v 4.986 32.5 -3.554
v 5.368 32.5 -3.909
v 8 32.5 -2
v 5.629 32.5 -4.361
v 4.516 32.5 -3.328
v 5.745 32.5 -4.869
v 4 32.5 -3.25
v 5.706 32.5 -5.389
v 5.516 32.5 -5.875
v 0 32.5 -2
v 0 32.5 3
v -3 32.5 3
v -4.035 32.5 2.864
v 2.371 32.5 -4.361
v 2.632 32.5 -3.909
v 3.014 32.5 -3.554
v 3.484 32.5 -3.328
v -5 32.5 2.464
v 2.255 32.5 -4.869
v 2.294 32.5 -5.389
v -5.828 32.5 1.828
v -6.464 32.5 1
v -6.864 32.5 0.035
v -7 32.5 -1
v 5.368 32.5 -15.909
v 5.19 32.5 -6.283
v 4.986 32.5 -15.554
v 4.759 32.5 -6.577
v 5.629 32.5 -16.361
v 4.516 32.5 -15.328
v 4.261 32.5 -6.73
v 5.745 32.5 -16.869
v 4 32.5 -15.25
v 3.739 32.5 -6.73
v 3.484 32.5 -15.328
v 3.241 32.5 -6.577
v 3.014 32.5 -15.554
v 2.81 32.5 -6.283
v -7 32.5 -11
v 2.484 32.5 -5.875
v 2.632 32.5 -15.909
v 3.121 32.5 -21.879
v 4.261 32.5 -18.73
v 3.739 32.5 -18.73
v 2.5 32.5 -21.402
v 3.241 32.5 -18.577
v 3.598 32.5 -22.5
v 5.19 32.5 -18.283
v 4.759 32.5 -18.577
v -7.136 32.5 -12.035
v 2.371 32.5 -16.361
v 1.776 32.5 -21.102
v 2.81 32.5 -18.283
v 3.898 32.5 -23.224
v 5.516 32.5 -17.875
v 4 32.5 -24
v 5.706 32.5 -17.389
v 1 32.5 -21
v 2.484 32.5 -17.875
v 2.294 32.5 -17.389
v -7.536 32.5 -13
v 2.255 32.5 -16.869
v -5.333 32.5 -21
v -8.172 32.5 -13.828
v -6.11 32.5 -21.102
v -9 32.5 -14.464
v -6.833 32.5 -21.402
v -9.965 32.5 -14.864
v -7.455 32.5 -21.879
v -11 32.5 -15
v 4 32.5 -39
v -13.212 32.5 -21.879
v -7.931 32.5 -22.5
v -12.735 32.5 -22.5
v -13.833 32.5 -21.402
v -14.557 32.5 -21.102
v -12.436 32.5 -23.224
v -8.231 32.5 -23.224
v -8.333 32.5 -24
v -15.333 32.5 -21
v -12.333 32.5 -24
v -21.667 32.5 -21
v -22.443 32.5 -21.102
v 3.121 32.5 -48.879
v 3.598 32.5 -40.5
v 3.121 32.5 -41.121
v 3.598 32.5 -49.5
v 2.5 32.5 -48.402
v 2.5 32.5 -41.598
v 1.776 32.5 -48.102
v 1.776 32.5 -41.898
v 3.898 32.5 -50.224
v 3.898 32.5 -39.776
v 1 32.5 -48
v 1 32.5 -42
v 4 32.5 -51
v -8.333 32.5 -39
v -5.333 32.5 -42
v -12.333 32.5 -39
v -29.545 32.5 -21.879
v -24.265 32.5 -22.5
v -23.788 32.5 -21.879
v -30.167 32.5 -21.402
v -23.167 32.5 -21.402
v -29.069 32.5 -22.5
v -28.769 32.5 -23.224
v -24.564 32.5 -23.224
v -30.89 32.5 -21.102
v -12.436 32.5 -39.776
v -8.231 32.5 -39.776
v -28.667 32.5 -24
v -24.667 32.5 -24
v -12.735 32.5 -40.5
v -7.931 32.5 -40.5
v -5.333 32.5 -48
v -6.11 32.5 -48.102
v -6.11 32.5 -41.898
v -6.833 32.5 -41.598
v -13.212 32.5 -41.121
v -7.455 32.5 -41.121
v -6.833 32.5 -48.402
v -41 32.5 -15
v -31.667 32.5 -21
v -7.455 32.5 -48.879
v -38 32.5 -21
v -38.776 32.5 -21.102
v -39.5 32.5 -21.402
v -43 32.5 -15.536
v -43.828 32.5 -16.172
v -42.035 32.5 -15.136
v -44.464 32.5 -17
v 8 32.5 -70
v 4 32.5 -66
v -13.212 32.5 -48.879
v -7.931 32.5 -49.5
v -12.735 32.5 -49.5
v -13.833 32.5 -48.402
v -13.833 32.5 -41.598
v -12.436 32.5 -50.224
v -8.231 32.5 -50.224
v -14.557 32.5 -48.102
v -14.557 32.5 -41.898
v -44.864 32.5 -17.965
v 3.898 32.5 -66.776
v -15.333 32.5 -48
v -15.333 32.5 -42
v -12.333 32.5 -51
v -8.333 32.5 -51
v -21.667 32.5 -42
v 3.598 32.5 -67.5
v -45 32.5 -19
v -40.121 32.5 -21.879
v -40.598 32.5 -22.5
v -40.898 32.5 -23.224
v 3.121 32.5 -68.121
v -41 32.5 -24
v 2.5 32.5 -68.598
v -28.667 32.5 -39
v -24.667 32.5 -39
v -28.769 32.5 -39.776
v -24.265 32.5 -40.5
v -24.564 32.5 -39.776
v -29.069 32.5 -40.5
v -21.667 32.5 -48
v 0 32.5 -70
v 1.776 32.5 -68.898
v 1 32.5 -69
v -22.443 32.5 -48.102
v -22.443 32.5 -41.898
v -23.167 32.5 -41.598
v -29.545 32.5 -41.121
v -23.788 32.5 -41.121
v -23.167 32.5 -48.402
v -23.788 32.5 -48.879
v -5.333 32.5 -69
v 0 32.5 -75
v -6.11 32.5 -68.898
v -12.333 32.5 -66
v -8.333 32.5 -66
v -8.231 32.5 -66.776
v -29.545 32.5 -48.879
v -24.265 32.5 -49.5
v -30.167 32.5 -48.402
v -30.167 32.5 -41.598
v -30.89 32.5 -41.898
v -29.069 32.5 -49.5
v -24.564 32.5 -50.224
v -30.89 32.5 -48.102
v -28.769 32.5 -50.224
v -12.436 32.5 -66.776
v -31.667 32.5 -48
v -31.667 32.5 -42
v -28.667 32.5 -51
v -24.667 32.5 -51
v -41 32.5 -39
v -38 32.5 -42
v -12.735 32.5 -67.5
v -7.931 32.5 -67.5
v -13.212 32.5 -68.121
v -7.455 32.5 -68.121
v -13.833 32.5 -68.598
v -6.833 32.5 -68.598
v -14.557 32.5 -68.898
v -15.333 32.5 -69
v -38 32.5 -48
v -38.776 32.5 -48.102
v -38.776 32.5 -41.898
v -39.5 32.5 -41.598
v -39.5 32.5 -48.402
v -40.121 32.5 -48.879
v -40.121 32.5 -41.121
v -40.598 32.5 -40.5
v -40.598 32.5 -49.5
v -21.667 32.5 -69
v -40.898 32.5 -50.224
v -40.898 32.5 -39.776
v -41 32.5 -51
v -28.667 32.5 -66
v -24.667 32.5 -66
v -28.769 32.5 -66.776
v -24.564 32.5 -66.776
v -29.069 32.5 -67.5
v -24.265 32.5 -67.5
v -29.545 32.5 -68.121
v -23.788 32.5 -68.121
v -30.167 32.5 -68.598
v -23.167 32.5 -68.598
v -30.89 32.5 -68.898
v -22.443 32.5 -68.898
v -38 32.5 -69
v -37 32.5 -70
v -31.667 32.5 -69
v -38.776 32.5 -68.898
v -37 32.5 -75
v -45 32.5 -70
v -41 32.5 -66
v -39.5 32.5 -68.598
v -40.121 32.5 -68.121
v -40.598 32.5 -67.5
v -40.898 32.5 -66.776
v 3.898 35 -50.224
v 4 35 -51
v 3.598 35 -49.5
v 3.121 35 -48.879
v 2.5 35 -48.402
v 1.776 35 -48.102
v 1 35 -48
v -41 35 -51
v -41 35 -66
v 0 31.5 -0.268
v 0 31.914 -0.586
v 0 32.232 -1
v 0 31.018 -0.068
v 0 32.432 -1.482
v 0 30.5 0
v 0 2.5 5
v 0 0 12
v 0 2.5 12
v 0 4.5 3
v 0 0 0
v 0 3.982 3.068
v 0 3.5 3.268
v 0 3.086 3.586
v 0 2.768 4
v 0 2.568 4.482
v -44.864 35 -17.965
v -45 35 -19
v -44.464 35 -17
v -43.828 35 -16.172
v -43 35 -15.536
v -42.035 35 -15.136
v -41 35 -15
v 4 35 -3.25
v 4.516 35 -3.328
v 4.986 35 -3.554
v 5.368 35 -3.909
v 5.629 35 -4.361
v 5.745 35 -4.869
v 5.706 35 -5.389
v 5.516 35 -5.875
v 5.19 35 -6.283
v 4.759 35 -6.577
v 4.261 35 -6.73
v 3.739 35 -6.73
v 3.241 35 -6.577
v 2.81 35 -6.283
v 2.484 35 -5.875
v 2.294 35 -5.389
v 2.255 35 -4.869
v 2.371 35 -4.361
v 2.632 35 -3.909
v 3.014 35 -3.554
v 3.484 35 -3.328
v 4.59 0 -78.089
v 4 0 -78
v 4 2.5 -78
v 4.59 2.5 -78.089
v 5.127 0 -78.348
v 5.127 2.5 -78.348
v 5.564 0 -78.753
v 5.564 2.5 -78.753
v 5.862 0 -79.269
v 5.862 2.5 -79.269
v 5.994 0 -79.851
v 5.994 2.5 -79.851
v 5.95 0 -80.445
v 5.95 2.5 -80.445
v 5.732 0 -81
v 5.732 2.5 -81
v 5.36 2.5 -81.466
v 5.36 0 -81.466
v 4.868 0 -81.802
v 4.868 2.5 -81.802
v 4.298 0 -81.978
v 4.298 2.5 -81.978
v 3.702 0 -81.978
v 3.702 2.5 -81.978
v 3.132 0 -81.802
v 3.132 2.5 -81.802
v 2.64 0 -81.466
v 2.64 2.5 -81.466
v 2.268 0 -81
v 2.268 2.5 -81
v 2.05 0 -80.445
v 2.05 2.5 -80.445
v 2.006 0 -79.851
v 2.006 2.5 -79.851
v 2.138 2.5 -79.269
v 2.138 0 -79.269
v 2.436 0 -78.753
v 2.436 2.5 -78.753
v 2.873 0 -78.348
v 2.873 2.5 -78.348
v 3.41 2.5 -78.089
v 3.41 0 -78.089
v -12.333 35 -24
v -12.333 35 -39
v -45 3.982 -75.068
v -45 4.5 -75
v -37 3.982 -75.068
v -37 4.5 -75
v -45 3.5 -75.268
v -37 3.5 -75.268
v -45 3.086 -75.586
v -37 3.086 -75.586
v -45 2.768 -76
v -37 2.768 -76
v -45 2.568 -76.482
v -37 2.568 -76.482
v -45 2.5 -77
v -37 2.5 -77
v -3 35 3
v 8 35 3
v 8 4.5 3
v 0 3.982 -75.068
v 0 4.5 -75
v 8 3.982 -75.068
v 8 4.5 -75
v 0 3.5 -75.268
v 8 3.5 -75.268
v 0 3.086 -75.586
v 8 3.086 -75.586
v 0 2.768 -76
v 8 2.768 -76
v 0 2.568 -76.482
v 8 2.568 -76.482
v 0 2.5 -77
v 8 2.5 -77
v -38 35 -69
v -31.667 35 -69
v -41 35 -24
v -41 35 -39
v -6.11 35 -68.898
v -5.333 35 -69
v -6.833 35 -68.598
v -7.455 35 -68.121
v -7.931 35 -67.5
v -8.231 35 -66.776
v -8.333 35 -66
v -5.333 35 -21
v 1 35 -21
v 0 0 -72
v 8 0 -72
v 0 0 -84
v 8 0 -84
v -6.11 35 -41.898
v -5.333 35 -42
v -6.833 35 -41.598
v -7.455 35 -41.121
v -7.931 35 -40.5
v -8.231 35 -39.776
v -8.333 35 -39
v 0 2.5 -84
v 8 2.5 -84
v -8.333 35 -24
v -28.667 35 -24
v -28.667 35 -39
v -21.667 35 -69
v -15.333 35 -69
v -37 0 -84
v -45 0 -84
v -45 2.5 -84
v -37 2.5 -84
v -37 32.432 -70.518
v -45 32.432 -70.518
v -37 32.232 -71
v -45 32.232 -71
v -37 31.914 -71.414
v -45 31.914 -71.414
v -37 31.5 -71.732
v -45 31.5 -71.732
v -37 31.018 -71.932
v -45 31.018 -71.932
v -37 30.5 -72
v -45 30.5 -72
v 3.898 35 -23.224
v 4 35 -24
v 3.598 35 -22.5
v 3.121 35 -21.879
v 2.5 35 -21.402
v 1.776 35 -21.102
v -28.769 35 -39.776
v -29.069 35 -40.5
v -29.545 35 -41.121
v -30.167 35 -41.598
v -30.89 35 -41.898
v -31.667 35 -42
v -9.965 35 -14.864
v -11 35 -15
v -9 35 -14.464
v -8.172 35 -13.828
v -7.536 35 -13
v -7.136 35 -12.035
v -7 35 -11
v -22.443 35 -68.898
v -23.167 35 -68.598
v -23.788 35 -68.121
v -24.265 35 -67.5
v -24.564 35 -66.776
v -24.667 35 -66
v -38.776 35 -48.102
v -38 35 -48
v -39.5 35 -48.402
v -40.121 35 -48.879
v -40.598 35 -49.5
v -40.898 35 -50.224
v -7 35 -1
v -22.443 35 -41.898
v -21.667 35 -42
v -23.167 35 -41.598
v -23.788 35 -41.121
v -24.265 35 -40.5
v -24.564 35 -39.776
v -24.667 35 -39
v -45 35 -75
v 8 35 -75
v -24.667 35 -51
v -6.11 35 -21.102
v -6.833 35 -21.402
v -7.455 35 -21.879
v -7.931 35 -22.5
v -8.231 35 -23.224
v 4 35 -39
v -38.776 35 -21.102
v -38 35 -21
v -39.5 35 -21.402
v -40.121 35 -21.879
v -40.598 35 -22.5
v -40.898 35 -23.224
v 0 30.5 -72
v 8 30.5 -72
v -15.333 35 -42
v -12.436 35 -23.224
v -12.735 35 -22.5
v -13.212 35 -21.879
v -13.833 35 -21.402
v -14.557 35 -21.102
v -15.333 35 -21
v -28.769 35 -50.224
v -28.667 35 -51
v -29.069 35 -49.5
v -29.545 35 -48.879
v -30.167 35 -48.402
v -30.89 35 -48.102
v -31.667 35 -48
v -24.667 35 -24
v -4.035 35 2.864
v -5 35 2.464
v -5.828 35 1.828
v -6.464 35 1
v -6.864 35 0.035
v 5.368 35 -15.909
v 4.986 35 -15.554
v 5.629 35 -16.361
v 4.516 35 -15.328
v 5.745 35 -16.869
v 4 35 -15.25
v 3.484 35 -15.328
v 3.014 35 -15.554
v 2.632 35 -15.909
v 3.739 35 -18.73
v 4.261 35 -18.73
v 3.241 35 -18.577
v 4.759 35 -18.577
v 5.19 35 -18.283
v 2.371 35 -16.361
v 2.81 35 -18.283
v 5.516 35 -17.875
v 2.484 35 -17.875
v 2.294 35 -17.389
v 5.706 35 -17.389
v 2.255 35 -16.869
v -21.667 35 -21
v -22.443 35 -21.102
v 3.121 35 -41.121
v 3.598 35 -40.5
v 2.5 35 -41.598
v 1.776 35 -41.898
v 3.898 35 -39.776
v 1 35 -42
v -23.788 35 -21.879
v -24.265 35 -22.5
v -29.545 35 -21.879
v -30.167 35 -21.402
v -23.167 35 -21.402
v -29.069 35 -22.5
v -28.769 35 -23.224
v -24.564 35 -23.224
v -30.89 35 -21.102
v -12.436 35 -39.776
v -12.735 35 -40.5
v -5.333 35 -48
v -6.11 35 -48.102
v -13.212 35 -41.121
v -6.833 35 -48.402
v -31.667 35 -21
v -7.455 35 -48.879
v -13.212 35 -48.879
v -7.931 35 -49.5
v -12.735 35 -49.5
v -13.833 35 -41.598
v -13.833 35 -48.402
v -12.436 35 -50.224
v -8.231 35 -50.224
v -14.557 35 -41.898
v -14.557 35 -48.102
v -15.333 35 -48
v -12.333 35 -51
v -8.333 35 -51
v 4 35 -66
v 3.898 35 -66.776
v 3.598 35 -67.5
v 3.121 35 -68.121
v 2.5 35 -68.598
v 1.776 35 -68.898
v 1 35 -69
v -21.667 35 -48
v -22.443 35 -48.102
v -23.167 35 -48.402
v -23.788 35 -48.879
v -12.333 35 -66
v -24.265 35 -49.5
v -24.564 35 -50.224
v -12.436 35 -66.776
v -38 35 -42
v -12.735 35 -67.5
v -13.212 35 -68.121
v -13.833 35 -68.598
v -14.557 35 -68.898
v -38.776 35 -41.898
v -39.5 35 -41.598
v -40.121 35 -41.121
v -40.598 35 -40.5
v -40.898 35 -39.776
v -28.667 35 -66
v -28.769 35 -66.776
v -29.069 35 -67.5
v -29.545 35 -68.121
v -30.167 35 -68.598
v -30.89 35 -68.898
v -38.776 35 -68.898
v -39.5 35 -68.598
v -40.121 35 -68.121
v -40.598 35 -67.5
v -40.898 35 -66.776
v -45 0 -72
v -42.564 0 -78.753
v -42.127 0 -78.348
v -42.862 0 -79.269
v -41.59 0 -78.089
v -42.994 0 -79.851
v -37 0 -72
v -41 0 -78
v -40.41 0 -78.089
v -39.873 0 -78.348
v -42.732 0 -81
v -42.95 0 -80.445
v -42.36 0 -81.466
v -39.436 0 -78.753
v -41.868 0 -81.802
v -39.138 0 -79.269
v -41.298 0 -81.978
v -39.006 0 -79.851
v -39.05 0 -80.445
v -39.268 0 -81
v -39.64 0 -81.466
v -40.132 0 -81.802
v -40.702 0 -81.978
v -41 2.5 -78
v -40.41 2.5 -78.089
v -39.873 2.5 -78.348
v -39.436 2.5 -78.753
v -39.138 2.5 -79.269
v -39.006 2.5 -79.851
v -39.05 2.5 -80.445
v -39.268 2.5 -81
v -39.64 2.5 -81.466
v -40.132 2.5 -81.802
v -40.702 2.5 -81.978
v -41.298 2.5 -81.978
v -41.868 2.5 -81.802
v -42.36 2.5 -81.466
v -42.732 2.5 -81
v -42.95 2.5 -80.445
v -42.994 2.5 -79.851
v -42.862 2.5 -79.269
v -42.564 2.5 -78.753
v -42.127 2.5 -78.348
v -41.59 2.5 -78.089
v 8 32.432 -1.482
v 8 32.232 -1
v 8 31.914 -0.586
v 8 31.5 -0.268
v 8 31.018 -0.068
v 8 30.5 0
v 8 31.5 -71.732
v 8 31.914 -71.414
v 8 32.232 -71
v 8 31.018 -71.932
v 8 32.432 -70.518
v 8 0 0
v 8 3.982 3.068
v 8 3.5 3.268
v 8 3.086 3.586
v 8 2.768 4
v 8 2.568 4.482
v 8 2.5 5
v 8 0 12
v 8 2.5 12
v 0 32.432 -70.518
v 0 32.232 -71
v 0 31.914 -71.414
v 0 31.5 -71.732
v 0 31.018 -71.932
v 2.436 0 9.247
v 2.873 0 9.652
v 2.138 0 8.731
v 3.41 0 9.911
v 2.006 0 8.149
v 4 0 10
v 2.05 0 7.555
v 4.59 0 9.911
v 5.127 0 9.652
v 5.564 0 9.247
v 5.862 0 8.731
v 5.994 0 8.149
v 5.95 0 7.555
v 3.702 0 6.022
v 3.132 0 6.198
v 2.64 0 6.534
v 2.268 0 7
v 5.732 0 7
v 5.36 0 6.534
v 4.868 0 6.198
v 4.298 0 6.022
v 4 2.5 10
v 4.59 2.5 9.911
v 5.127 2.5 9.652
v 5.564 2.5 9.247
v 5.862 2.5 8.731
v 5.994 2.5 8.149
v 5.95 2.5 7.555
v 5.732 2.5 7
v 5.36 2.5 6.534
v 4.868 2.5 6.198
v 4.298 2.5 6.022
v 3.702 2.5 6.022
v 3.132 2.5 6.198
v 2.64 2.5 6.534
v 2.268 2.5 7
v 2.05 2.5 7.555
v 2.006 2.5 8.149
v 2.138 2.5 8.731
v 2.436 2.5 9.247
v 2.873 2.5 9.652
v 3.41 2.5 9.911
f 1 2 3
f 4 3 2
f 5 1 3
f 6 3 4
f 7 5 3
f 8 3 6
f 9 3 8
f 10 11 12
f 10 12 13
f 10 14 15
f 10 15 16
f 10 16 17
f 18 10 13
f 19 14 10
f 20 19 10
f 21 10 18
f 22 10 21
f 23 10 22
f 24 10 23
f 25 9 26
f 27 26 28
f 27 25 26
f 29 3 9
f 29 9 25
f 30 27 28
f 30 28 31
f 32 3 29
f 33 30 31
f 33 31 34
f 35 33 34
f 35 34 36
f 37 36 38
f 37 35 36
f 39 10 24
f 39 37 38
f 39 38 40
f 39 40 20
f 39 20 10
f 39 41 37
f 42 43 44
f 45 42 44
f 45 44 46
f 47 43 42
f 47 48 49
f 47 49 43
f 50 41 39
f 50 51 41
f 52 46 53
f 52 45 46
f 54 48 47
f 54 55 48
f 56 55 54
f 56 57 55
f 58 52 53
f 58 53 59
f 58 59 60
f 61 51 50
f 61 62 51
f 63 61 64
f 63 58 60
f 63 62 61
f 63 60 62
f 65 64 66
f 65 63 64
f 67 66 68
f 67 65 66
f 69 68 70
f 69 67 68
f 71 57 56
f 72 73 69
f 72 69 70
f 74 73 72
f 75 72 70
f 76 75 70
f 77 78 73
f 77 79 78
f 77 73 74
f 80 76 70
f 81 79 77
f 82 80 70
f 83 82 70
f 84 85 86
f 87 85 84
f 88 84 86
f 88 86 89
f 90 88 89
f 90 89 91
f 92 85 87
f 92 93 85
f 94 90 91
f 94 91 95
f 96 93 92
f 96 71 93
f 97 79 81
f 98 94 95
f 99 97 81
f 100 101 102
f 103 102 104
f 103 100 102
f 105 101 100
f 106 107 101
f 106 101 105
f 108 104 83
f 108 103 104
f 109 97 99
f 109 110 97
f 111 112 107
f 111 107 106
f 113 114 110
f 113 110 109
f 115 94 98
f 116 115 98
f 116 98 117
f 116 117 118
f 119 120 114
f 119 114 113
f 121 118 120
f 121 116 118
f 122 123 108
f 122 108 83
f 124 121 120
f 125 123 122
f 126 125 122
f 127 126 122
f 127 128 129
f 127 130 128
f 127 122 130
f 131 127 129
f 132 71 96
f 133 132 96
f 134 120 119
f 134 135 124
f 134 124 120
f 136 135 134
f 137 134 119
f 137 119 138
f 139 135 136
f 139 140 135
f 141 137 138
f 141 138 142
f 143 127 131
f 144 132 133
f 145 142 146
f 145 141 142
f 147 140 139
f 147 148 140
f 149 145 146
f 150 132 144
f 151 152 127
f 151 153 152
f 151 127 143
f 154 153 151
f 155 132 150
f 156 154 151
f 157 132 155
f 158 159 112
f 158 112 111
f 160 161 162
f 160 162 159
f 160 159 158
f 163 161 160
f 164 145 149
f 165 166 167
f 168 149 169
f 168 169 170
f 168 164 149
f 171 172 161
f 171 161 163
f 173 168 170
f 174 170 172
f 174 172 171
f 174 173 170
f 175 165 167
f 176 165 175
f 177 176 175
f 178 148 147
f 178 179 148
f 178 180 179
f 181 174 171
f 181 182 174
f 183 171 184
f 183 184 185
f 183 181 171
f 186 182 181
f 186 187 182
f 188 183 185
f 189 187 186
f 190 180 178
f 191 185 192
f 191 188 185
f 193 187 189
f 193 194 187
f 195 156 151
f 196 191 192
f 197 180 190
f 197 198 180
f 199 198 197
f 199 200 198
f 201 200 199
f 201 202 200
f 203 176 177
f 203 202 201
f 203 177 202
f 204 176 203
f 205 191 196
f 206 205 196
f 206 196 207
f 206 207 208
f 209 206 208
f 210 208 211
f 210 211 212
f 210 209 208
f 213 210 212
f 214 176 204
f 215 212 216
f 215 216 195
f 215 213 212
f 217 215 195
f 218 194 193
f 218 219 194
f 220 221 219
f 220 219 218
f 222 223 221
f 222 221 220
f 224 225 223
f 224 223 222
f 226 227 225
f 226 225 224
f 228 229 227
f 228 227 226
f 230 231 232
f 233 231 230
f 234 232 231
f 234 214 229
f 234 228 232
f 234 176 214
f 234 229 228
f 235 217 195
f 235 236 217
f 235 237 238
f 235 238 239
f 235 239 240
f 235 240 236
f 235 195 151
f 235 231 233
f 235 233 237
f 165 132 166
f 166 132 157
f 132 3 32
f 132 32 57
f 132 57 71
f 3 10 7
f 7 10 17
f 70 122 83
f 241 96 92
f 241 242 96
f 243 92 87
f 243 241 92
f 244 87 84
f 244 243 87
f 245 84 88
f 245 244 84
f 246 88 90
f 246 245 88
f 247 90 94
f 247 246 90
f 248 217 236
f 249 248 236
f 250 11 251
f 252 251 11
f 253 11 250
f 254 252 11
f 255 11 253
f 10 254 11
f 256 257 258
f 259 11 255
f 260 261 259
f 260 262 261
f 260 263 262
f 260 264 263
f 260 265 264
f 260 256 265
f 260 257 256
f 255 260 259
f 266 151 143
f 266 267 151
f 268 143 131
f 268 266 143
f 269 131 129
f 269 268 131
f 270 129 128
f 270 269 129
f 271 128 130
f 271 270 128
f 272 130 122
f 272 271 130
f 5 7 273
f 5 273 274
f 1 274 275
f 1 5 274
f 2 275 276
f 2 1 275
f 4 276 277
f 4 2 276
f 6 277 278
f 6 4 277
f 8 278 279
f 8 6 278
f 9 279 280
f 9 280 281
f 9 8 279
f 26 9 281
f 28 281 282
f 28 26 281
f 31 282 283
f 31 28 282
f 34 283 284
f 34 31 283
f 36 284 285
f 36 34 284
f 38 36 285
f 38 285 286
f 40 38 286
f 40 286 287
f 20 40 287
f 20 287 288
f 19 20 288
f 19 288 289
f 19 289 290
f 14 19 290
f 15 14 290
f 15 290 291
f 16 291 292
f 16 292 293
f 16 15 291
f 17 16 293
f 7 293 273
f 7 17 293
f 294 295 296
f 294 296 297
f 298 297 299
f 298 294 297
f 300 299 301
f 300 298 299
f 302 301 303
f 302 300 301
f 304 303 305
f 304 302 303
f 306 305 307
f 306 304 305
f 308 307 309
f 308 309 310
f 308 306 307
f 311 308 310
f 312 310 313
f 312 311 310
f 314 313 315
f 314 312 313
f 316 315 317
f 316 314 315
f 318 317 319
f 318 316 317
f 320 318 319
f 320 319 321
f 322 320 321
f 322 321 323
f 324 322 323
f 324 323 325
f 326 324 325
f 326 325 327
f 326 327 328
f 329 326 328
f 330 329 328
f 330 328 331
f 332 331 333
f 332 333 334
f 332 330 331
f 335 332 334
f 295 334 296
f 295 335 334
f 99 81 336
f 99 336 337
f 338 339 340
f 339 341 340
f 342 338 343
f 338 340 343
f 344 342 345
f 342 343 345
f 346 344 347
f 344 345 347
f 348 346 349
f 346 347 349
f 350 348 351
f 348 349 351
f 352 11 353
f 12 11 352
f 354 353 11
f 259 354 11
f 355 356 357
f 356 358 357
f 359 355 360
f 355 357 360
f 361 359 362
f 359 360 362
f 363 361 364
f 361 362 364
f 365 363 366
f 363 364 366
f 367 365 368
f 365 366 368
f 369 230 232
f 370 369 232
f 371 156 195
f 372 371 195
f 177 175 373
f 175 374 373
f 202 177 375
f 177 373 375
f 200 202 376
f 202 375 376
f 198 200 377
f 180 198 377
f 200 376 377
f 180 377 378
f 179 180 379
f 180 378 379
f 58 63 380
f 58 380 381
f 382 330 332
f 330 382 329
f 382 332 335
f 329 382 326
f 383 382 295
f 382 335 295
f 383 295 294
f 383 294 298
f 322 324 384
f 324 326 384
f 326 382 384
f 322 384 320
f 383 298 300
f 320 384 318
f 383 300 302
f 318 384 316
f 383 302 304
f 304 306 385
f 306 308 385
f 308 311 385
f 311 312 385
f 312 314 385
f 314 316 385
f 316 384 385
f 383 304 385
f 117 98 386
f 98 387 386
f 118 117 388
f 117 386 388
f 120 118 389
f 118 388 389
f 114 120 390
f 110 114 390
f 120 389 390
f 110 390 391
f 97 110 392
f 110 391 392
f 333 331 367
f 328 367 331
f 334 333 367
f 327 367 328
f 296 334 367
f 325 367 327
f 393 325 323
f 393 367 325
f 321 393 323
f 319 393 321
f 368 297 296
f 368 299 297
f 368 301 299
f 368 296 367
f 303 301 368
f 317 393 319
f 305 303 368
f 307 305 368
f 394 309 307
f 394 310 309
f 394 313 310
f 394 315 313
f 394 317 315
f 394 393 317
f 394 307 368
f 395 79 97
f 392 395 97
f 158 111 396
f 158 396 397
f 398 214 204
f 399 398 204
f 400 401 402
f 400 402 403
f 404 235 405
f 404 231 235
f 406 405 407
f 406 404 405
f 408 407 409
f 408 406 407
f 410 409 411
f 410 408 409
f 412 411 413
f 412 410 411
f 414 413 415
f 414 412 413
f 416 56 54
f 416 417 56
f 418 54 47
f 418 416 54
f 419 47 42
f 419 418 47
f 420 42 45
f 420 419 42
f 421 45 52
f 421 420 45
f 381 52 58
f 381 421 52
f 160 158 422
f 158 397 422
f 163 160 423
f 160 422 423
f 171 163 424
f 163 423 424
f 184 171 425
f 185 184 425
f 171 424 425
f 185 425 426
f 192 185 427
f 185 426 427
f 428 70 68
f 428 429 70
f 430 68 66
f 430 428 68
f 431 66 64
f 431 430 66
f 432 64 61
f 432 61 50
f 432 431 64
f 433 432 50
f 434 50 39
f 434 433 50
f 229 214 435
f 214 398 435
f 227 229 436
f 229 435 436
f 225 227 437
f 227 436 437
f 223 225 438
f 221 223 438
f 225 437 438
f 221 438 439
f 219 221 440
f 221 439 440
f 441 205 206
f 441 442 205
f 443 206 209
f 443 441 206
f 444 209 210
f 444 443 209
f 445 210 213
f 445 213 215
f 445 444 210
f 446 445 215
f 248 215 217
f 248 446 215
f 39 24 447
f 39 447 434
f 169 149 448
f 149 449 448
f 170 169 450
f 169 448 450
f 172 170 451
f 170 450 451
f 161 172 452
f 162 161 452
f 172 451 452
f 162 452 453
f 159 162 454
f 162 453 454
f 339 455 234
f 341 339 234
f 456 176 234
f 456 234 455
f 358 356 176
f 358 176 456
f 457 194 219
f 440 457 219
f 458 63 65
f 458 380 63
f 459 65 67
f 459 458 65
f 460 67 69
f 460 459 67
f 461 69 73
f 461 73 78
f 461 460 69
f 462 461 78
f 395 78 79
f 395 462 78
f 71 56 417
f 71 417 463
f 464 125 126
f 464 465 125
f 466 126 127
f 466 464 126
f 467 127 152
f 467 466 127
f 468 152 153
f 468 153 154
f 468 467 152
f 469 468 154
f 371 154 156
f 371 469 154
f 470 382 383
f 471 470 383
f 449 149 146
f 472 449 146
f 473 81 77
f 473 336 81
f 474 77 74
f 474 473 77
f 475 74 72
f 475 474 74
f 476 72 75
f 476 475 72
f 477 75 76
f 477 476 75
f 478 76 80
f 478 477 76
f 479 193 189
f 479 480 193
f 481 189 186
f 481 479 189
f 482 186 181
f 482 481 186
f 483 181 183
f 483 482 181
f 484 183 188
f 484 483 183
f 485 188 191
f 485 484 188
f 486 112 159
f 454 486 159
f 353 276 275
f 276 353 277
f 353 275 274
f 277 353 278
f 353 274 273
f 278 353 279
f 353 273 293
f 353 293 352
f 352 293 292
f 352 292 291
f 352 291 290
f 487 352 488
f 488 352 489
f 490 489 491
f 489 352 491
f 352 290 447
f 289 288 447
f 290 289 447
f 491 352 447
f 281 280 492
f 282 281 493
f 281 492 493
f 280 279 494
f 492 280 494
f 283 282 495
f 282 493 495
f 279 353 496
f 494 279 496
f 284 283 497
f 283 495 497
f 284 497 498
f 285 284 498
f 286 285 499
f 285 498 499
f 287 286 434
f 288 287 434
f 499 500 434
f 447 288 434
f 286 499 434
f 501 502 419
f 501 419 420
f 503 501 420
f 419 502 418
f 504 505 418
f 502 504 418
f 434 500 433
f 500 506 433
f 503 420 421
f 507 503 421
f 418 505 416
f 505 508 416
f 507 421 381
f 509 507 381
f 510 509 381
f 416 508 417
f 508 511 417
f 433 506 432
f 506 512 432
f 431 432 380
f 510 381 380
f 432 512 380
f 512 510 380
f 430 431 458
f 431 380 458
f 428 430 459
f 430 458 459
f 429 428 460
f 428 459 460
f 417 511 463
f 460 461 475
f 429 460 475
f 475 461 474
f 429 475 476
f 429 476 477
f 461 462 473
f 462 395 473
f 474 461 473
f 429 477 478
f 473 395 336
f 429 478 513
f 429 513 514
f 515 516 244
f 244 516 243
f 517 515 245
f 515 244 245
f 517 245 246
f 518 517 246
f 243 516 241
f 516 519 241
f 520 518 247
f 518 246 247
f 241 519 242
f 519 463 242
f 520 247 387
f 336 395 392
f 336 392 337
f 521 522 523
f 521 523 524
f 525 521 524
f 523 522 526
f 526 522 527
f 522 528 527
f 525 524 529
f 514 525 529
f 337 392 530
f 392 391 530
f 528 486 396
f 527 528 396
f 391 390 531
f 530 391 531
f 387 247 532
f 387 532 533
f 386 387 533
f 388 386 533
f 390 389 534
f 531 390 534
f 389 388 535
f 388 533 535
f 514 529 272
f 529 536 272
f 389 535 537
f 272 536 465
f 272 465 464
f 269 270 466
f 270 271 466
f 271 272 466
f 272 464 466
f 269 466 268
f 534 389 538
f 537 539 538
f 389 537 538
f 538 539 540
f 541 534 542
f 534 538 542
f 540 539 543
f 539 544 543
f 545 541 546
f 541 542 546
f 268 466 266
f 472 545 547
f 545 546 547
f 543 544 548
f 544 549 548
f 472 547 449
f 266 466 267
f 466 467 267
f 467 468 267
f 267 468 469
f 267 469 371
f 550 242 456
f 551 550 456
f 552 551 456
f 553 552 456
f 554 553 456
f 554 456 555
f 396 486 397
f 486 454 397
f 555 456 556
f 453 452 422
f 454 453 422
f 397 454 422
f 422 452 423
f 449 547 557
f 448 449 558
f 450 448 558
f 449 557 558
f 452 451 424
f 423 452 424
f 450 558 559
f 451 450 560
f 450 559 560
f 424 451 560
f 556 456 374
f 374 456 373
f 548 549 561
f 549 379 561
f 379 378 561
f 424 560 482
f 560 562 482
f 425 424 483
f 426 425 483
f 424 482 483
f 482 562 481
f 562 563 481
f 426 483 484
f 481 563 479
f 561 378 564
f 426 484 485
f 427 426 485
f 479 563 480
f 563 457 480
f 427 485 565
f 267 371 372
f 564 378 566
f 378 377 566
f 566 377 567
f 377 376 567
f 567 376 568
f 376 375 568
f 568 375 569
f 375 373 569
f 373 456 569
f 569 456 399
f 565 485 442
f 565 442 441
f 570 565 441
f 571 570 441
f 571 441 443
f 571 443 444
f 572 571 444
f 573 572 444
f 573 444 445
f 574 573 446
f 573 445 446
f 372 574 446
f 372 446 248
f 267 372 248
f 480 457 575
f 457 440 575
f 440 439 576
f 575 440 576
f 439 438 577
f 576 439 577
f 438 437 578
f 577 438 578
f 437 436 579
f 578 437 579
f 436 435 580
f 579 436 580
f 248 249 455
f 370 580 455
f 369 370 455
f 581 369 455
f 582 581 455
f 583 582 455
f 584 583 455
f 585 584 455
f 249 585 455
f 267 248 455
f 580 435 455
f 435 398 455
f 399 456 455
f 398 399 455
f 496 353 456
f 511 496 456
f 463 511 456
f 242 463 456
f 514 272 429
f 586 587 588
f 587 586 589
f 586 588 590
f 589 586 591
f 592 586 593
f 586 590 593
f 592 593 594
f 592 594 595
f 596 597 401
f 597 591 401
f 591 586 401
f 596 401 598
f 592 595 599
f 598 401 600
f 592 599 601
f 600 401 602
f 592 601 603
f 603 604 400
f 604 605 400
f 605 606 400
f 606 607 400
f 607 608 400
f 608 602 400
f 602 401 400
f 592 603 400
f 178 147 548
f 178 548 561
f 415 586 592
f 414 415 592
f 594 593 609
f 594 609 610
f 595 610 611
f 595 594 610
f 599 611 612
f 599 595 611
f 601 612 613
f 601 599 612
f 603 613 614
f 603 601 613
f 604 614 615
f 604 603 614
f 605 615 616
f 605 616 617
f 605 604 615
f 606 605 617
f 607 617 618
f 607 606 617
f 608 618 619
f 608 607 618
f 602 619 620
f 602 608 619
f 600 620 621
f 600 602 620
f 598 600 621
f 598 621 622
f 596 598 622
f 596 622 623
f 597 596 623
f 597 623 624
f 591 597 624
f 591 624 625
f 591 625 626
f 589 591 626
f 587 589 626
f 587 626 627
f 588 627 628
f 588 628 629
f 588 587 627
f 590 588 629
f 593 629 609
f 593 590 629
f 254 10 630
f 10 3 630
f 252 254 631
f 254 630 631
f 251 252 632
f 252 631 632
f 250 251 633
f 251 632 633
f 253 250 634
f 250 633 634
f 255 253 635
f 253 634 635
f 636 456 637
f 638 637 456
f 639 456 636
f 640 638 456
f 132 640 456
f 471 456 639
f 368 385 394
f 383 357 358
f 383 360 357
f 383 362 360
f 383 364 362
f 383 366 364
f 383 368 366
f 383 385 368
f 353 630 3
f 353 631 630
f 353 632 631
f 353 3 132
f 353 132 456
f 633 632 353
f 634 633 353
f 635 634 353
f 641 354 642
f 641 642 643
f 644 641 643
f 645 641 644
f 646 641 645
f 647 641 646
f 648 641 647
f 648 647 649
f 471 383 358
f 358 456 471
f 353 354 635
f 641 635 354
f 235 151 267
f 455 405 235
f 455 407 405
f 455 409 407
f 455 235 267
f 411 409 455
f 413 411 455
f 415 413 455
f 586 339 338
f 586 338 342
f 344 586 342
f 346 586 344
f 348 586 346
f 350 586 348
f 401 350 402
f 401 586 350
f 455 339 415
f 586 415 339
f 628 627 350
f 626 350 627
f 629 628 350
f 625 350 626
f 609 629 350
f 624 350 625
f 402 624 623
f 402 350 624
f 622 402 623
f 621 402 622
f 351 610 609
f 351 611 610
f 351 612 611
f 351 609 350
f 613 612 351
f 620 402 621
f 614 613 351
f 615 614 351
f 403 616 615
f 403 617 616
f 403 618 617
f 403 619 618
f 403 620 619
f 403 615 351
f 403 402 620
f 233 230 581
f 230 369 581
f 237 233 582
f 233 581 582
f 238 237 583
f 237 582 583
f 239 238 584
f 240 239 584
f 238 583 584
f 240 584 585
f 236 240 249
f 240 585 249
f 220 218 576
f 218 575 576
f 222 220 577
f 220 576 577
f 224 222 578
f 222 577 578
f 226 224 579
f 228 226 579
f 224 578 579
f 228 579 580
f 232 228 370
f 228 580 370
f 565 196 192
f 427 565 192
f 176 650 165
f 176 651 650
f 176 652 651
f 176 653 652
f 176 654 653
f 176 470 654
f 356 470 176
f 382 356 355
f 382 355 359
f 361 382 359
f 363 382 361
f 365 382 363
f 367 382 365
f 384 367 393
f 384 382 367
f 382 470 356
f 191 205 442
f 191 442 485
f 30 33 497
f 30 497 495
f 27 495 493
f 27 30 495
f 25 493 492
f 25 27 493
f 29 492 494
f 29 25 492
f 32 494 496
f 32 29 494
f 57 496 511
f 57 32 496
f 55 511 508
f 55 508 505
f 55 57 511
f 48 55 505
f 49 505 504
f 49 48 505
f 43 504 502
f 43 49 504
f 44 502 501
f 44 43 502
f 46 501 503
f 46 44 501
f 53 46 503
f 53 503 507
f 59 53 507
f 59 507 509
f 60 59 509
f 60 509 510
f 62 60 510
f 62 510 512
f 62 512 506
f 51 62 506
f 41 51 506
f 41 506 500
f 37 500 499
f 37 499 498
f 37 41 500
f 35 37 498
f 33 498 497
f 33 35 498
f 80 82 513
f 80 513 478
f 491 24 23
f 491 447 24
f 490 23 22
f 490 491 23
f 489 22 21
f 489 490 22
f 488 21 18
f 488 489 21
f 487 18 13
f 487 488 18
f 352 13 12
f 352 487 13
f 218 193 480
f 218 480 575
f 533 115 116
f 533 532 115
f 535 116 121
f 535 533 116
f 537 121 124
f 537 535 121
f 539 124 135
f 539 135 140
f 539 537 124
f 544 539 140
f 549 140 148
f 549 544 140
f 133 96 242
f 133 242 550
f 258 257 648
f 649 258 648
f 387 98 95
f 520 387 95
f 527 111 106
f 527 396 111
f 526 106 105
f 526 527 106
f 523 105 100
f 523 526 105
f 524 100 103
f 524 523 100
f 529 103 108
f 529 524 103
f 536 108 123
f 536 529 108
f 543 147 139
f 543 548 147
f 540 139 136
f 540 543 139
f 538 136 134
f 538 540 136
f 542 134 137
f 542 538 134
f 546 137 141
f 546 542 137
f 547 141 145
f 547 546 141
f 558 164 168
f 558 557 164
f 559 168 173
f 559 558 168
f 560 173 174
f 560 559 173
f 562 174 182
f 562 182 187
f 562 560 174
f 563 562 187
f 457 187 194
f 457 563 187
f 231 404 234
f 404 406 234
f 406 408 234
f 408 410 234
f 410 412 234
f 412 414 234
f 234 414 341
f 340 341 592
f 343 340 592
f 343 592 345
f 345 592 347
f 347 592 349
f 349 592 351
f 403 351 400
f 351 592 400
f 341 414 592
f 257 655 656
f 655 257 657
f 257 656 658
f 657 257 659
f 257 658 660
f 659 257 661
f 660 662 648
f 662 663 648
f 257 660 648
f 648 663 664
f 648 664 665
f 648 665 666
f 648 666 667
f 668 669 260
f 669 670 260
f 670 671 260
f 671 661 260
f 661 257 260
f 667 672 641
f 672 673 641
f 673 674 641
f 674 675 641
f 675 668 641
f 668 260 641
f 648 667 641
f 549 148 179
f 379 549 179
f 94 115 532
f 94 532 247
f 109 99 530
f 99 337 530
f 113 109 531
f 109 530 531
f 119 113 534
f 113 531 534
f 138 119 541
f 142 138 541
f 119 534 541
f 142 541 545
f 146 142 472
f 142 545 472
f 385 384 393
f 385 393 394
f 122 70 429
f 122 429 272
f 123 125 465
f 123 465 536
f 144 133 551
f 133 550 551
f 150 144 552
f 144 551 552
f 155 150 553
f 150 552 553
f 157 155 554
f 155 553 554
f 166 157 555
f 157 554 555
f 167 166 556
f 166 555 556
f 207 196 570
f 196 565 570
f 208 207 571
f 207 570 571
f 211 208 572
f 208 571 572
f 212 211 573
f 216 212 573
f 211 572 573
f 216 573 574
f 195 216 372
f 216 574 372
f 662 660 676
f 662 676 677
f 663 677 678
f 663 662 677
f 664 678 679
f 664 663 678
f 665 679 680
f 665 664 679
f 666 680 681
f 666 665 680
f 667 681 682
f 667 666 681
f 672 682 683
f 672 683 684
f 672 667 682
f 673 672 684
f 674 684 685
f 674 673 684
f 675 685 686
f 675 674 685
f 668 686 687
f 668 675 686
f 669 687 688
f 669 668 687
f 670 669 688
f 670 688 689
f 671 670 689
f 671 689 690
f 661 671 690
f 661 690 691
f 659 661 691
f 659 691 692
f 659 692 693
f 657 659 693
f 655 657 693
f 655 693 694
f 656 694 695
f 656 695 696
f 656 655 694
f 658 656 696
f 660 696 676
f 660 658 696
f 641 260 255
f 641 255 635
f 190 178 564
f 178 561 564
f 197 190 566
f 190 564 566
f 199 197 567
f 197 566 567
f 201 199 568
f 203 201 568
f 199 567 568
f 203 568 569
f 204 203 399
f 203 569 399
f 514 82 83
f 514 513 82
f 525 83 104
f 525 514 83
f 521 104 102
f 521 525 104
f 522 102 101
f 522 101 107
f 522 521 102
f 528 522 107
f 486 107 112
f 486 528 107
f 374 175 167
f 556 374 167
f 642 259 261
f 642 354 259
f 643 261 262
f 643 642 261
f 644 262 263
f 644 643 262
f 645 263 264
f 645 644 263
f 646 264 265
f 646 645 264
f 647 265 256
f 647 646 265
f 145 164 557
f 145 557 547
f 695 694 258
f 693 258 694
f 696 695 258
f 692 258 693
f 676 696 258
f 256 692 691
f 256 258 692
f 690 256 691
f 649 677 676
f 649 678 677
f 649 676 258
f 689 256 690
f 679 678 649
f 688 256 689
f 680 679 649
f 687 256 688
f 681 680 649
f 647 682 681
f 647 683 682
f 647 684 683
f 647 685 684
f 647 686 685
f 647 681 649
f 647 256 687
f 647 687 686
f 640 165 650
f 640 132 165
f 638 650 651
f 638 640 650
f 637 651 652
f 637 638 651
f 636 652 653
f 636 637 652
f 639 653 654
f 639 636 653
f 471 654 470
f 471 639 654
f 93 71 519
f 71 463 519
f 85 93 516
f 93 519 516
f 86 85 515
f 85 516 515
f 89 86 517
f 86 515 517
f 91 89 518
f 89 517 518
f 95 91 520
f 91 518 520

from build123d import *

# Parameters (mm, degrees)
SKETCH1_W             = 8
SKETCH1_H             = 12
SKETCH1_R             = 2
BOSS_EXTRUDE1_DEPTH   = 2.5
BOSS_EXTRUDE1_2_DEPTH = 2.5
BOSS_EXTRUDE1_3_DEPTH = 2.5
SKETCH2_W             = 8
SKETCH2_H             = 3
BOSS_EXTRUDE2_DEPTH   = 30
SKETCH3_R             = 1.75
SKETCH3_W             = 12.333333333
SKETCH3_H             = 21
SKETCH3_W_2           = 12.333333334
BOSS_EXTRUDE3_DEPTH   = 2.5
FILLET1_R             = 3
FILLET2_R             = 4
FILLET3_R             = 2
FILLET4_R             = 2


with BuildPart() as part:
    # Sketch1 → Boss-Extrude1 (new body)
    with BuildSketch(Plane(origin=(0, 0, 0), x_dir=(1, 0, 0), z_dir=(0, 1, 0))):
        with Locations((-41, 78)):
            Rectangle(SKETCH1_W, SKETCH1_H)
        with Locations(Location((-41, 80, 0), (0, 0, 270))):
            Circle(SKETCH1_R, mode=Mode.SUBTRACT)
    extrude(amount=BOSS_EXTRUDE1_DEPTH)



with BuildPart() as body_2:
    # Sketch1 → Boss-Extrude1 2 (new body)
    with BuildSketch(Plane(origin=(0, 0, 0), x_dir=(1, 0, 0), z_dir=(0, 1, 0))):
        with Locations((4, -6)):
            Rectangle(SKETCH1_W, SKETCH1_H)
        with Locations(Location((4, -8, 0), (0, 0, 270))):
            Circle(SKETCH1_R, mode=Mode.SUBTRACT)
    extrude(amount=BOSS_EXTRUDE1_2_DEPTH)


with BuildPart() as body_3:
    # Sketch1 → Boss-Extrude1 3 (new body)
    with BuildSketch(Plane(origin=(0, 0, 0), x_dir=(1, 0, 0), z_dir=(0, 1, 0))):
        with Locations((4, 78)):
            Rectangle(SKETCH1_W, SKETCH1_H)
        with Locations(Location((4, 80, 0), (0, 0, 270))):
            Circle(SKETCH1_R, mode=Mode.SUBTRACT)
    extrude(amount=BOSS_EXTRUDE1_3_DEPTH)


with BuildPart() as part_1:
    add(part.part)

    add(body_2.part)  # Boss-Extrude2 merges body 2

    add(body_3.part)  # Boss-Extrude2 merges body 3
    # Sketch2 → Boss-Extrude2 (add)
    with BuildSketch(Plane(origin=(0, 2.5, 0), x_dir=(1, 0, 0), z_dir=(0, 1, 0))):
        with Locations((-41, 73.5)):
            Rectangle(SKETCH2_W, SKETCH2_H)
        with Locations((4, 73.5)):
            Rectangle(SKETCH2_W, SKETCH2_H)
        with Locations((4, -1.5)):
            Rectangle(SKETCH2_W, SKETCH2_H)
    extrude(amount=BOSS_EXTRUDE2_DEPTH)

    # Sketch3 → Boss-Extrude3 (add)
    with BuildSketch(Plane(origin=(0, 32.5, 0), x_dir=(1, 0, 0), z_dir=(0, 1, 0))):
        Polygon((-45, 75), (8, 75), (8, -3), (-7, -3), (-7, 15), (-45, 15), align=None)
        with Locations(Location((4, 5, 0), (0, 0, 270))):
            Circle(SKETCH3_R, mode=Mode.SUBTRACT)
        with Locations(Location((4, 17, 0), (0, 0, 270))):
            Circle(SKETCH3_R, mode=Mode.SUBTRACT)
        with Locations((-34.833333334, 58.5)):
            Rectangle(SKETCH3_W, SKETCH3_H, mode=Mode.SUBTRACT)
        with Locations((-18.5, 58.5)):
            Rectangle(SKETCH3_W_2, SKETCH3_H, mode=Mode.SUBTRACT)
        with Locations((-2.166666667, 58.5)):
            Rectangle(SKETCH3_W, SKETCH3_H, mode=Mode.SUBTRACT)
        with Locations((-34.833333334, 31.5)):
            Rectangle(SKETCH3_W, SKETCH3_H, mode=Mode.SUBTRACT)
        with Locations((-18.5, 31.5)):
            Rectangle(SKETCH3_W_2, SKETCH3_H, mode=Mode.SUBTRACT)
        with Locations((-2.166666667, 31.5)):
            Rectangle(SKETCH3_W, SKETCH3_H, mode=Mode.SUBTRACT)
    extrude(amount=BOSS_EXTRUDE3_DEPTH)

    # Fillet1
    fillet1_edges = [part_1.edges().sort_by_distance(p)[0] for p in [
        (-24.666666667, 33.75, -48),
        (-12.333333333, 33.75, -48),
        (-12.333333333, 33.75, -69),
        (-24.666666667, 33.75, -69),
        (-41, 33.75, -48),
        (-28.666666667, 33.75, -48),
        (-28.666666667, 33.75, -69),
        (-41, 33.75, -69),
        (-8.333333333, 33.75, -48),
        (4, 33.75, -48),
        (4, 33.75, -69),
        (-8.333333333, 33.75, -69),
        (-41, 33.75, -21),
        (-28.666666667, 33.75, -21),
        (-28.666666667, 33.75, -42),
        (-41, 33.75, -42),
        (-24.666666667, 33.75, -21),
        (-12.333333333, 33.75, -21),
        (-12.333333333, 33.75, -42),
        (-24.666666667, 33.75, -42),
        (-8.333333333, 33.75, -21),
        (4, 33.75, -21),
        (4, 33.75, -42),
        (-8.333333333, 33.75, -42),
    ]]
    fillet(fillet1_edges, radius=FILLET1_R)

    # Fillet2
    fillet2_edges = [part_1.edges().sort_by_distance(p)[0] for p in [
        (-45, 33.75, -15),
        (-7, 33.75, -15),
        (-7, 33.75, 3),
    ]]
    fillet(fillet2_edges, radius=FILLET2_R)

    # Fillet3
    fillet3_edges = [part_1.edges().sort_by_distance(p)[0] for p in [
        (4, 2.5, 3),
        (4, 2.5, -75),
        (-41, 2.5, -75),
    ]]
    fillet(fillet3_edges, radius=FILLET3_R)

    # Fillet4
    fillet4_edges = [part_1.edges().sort_by_distance(p)[0] for p in [
        (4, 32.5, 0),
        (4, 32.5, -72),
        (-41, 32.5, -72),
    ]]
    fillet(fillet4_edges, radius=FILLET4_R)


solid = part_1.part
